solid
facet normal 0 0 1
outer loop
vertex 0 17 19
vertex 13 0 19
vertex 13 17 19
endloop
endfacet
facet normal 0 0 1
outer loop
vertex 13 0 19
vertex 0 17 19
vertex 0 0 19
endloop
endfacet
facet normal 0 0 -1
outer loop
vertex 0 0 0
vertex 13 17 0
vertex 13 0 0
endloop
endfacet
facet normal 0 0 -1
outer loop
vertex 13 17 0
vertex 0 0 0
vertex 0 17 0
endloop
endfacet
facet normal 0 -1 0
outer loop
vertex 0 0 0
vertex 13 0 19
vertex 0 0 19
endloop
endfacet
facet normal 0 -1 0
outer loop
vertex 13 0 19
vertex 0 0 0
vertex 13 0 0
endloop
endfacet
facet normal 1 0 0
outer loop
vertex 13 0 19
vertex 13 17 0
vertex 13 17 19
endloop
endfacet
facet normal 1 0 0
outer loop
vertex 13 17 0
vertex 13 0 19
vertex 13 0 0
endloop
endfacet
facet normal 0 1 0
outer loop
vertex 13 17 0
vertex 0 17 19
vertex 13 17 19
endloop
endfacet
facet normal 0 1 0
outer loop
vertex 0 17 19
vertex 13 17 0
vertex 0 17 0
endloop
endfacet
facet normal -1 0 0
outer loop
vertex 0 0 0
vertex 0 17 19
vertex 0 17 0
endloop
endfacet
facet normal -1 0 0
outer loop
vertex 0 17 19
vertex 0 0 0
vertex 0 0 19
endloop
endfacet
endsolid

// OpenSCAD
// Generated by SolidPython 1.0.1 on 2020-07-29 00:39:26


cube(size = [13, 17, 19]);
/***********************************************
*********      SolidPython code:      **********
************************************************
 
# import packages: SolidPython
from solid import *
from solid.utils import *
from itertools import chain, combinations


class Resize:

    def __init__(self, scad_file):
        self.scad_file = scad_file
        #self.scad_file = import_scad(scad_file)
        # cone/cylinder param:
        self.r1 = 0
        self.r2 = 0
        self.h = 0
        # rectangular prism param:
        self.w = 0
        self.l = 0
        # ellipse param:
        self.r = 0

    # import OpenScad code (file name corresponds to shape)


    # classify shape + parameters
    def assign(self, param1, param2, param3):
        if self.scad_file == 'cone.scad':
            self.r1 = param1
            self.r2 = param2
            self.h = param3
        elif self.scad_file == 'cylinder.scad':
            self.r1 = param1
            self.r2 = param2
            self.h = param3
        elif self.scad_file == 'rectangularPrism.scad':
            self.h = param1
            self.l = param2
            self.w = param3
        else:
            self.r = param1
            self.h = param2

    # resize parameters
    def iterate(self):
        x = range(3, 20, 2)
        i = 1
        if self.scad_file == 'cone.scad':
            tempList = list(combinations(x, 2))
            for temp in tempList:
                param1 = temp[0]
                param2 = temp[1]
                filepath = 'produced_scad_files/' + 'cone' + str(param1) + '_' + str(param2) + '_' + '.scad'
                scad_render_to_file(cylinder(h=param1, r1=param2, r2=0), filepath)

        elif self.scad_file == 'cylinder.scad':
            tempList = list(combinations(x, 3))
            for temp in tempList:
                param1 = temp[0]
                param2 = temp[1]
                filepath = 'produced_scad_files/' + 'cylinder' + str(param1) + '_' + str(param2) + '_' + '.scad'
                scad_render_to_file(cylinder(h=param1, r1=param2, r2=param2), filepath)

        elif self.scad_file == 'rectangularPrism.scad':
            tempList = list(combinations(x, 3))
            for temp in tempList:
                param1 = temp[0]
                param2 = temp[1]
                param3 = temp[2]
                filepath = 'produced_scad_files/' + 'rectangularPrism' + str(param1) + '_' + str(param2) + '_' + str(
                    param3) + '.scad'
                scad_render_to_file(cube(size=(param1, param2, param3)), filepath)

        elif self.scad_file == 'ellipse.scad':
            tempList = list(combinations(x, 4))
            for temp in tempList:
                param1 = temp[0]
                param2 = temp[1]
                param3 = temp[2]
                param4 = temp[3]
                filepath = 'produced_scad_files/' + 'ellipse' + str(param1) + '_' + str(param2) + '_' + str(param3) + '_' + str(param4) + '.scad'
                scad_render_to_file(scale([param1, param2, param3])(sphere(r=param4)), filepath)

    def render_to_scadfile(self):
        scad_render_to_file(scad, 'example.scad') 
 
************************************************/
